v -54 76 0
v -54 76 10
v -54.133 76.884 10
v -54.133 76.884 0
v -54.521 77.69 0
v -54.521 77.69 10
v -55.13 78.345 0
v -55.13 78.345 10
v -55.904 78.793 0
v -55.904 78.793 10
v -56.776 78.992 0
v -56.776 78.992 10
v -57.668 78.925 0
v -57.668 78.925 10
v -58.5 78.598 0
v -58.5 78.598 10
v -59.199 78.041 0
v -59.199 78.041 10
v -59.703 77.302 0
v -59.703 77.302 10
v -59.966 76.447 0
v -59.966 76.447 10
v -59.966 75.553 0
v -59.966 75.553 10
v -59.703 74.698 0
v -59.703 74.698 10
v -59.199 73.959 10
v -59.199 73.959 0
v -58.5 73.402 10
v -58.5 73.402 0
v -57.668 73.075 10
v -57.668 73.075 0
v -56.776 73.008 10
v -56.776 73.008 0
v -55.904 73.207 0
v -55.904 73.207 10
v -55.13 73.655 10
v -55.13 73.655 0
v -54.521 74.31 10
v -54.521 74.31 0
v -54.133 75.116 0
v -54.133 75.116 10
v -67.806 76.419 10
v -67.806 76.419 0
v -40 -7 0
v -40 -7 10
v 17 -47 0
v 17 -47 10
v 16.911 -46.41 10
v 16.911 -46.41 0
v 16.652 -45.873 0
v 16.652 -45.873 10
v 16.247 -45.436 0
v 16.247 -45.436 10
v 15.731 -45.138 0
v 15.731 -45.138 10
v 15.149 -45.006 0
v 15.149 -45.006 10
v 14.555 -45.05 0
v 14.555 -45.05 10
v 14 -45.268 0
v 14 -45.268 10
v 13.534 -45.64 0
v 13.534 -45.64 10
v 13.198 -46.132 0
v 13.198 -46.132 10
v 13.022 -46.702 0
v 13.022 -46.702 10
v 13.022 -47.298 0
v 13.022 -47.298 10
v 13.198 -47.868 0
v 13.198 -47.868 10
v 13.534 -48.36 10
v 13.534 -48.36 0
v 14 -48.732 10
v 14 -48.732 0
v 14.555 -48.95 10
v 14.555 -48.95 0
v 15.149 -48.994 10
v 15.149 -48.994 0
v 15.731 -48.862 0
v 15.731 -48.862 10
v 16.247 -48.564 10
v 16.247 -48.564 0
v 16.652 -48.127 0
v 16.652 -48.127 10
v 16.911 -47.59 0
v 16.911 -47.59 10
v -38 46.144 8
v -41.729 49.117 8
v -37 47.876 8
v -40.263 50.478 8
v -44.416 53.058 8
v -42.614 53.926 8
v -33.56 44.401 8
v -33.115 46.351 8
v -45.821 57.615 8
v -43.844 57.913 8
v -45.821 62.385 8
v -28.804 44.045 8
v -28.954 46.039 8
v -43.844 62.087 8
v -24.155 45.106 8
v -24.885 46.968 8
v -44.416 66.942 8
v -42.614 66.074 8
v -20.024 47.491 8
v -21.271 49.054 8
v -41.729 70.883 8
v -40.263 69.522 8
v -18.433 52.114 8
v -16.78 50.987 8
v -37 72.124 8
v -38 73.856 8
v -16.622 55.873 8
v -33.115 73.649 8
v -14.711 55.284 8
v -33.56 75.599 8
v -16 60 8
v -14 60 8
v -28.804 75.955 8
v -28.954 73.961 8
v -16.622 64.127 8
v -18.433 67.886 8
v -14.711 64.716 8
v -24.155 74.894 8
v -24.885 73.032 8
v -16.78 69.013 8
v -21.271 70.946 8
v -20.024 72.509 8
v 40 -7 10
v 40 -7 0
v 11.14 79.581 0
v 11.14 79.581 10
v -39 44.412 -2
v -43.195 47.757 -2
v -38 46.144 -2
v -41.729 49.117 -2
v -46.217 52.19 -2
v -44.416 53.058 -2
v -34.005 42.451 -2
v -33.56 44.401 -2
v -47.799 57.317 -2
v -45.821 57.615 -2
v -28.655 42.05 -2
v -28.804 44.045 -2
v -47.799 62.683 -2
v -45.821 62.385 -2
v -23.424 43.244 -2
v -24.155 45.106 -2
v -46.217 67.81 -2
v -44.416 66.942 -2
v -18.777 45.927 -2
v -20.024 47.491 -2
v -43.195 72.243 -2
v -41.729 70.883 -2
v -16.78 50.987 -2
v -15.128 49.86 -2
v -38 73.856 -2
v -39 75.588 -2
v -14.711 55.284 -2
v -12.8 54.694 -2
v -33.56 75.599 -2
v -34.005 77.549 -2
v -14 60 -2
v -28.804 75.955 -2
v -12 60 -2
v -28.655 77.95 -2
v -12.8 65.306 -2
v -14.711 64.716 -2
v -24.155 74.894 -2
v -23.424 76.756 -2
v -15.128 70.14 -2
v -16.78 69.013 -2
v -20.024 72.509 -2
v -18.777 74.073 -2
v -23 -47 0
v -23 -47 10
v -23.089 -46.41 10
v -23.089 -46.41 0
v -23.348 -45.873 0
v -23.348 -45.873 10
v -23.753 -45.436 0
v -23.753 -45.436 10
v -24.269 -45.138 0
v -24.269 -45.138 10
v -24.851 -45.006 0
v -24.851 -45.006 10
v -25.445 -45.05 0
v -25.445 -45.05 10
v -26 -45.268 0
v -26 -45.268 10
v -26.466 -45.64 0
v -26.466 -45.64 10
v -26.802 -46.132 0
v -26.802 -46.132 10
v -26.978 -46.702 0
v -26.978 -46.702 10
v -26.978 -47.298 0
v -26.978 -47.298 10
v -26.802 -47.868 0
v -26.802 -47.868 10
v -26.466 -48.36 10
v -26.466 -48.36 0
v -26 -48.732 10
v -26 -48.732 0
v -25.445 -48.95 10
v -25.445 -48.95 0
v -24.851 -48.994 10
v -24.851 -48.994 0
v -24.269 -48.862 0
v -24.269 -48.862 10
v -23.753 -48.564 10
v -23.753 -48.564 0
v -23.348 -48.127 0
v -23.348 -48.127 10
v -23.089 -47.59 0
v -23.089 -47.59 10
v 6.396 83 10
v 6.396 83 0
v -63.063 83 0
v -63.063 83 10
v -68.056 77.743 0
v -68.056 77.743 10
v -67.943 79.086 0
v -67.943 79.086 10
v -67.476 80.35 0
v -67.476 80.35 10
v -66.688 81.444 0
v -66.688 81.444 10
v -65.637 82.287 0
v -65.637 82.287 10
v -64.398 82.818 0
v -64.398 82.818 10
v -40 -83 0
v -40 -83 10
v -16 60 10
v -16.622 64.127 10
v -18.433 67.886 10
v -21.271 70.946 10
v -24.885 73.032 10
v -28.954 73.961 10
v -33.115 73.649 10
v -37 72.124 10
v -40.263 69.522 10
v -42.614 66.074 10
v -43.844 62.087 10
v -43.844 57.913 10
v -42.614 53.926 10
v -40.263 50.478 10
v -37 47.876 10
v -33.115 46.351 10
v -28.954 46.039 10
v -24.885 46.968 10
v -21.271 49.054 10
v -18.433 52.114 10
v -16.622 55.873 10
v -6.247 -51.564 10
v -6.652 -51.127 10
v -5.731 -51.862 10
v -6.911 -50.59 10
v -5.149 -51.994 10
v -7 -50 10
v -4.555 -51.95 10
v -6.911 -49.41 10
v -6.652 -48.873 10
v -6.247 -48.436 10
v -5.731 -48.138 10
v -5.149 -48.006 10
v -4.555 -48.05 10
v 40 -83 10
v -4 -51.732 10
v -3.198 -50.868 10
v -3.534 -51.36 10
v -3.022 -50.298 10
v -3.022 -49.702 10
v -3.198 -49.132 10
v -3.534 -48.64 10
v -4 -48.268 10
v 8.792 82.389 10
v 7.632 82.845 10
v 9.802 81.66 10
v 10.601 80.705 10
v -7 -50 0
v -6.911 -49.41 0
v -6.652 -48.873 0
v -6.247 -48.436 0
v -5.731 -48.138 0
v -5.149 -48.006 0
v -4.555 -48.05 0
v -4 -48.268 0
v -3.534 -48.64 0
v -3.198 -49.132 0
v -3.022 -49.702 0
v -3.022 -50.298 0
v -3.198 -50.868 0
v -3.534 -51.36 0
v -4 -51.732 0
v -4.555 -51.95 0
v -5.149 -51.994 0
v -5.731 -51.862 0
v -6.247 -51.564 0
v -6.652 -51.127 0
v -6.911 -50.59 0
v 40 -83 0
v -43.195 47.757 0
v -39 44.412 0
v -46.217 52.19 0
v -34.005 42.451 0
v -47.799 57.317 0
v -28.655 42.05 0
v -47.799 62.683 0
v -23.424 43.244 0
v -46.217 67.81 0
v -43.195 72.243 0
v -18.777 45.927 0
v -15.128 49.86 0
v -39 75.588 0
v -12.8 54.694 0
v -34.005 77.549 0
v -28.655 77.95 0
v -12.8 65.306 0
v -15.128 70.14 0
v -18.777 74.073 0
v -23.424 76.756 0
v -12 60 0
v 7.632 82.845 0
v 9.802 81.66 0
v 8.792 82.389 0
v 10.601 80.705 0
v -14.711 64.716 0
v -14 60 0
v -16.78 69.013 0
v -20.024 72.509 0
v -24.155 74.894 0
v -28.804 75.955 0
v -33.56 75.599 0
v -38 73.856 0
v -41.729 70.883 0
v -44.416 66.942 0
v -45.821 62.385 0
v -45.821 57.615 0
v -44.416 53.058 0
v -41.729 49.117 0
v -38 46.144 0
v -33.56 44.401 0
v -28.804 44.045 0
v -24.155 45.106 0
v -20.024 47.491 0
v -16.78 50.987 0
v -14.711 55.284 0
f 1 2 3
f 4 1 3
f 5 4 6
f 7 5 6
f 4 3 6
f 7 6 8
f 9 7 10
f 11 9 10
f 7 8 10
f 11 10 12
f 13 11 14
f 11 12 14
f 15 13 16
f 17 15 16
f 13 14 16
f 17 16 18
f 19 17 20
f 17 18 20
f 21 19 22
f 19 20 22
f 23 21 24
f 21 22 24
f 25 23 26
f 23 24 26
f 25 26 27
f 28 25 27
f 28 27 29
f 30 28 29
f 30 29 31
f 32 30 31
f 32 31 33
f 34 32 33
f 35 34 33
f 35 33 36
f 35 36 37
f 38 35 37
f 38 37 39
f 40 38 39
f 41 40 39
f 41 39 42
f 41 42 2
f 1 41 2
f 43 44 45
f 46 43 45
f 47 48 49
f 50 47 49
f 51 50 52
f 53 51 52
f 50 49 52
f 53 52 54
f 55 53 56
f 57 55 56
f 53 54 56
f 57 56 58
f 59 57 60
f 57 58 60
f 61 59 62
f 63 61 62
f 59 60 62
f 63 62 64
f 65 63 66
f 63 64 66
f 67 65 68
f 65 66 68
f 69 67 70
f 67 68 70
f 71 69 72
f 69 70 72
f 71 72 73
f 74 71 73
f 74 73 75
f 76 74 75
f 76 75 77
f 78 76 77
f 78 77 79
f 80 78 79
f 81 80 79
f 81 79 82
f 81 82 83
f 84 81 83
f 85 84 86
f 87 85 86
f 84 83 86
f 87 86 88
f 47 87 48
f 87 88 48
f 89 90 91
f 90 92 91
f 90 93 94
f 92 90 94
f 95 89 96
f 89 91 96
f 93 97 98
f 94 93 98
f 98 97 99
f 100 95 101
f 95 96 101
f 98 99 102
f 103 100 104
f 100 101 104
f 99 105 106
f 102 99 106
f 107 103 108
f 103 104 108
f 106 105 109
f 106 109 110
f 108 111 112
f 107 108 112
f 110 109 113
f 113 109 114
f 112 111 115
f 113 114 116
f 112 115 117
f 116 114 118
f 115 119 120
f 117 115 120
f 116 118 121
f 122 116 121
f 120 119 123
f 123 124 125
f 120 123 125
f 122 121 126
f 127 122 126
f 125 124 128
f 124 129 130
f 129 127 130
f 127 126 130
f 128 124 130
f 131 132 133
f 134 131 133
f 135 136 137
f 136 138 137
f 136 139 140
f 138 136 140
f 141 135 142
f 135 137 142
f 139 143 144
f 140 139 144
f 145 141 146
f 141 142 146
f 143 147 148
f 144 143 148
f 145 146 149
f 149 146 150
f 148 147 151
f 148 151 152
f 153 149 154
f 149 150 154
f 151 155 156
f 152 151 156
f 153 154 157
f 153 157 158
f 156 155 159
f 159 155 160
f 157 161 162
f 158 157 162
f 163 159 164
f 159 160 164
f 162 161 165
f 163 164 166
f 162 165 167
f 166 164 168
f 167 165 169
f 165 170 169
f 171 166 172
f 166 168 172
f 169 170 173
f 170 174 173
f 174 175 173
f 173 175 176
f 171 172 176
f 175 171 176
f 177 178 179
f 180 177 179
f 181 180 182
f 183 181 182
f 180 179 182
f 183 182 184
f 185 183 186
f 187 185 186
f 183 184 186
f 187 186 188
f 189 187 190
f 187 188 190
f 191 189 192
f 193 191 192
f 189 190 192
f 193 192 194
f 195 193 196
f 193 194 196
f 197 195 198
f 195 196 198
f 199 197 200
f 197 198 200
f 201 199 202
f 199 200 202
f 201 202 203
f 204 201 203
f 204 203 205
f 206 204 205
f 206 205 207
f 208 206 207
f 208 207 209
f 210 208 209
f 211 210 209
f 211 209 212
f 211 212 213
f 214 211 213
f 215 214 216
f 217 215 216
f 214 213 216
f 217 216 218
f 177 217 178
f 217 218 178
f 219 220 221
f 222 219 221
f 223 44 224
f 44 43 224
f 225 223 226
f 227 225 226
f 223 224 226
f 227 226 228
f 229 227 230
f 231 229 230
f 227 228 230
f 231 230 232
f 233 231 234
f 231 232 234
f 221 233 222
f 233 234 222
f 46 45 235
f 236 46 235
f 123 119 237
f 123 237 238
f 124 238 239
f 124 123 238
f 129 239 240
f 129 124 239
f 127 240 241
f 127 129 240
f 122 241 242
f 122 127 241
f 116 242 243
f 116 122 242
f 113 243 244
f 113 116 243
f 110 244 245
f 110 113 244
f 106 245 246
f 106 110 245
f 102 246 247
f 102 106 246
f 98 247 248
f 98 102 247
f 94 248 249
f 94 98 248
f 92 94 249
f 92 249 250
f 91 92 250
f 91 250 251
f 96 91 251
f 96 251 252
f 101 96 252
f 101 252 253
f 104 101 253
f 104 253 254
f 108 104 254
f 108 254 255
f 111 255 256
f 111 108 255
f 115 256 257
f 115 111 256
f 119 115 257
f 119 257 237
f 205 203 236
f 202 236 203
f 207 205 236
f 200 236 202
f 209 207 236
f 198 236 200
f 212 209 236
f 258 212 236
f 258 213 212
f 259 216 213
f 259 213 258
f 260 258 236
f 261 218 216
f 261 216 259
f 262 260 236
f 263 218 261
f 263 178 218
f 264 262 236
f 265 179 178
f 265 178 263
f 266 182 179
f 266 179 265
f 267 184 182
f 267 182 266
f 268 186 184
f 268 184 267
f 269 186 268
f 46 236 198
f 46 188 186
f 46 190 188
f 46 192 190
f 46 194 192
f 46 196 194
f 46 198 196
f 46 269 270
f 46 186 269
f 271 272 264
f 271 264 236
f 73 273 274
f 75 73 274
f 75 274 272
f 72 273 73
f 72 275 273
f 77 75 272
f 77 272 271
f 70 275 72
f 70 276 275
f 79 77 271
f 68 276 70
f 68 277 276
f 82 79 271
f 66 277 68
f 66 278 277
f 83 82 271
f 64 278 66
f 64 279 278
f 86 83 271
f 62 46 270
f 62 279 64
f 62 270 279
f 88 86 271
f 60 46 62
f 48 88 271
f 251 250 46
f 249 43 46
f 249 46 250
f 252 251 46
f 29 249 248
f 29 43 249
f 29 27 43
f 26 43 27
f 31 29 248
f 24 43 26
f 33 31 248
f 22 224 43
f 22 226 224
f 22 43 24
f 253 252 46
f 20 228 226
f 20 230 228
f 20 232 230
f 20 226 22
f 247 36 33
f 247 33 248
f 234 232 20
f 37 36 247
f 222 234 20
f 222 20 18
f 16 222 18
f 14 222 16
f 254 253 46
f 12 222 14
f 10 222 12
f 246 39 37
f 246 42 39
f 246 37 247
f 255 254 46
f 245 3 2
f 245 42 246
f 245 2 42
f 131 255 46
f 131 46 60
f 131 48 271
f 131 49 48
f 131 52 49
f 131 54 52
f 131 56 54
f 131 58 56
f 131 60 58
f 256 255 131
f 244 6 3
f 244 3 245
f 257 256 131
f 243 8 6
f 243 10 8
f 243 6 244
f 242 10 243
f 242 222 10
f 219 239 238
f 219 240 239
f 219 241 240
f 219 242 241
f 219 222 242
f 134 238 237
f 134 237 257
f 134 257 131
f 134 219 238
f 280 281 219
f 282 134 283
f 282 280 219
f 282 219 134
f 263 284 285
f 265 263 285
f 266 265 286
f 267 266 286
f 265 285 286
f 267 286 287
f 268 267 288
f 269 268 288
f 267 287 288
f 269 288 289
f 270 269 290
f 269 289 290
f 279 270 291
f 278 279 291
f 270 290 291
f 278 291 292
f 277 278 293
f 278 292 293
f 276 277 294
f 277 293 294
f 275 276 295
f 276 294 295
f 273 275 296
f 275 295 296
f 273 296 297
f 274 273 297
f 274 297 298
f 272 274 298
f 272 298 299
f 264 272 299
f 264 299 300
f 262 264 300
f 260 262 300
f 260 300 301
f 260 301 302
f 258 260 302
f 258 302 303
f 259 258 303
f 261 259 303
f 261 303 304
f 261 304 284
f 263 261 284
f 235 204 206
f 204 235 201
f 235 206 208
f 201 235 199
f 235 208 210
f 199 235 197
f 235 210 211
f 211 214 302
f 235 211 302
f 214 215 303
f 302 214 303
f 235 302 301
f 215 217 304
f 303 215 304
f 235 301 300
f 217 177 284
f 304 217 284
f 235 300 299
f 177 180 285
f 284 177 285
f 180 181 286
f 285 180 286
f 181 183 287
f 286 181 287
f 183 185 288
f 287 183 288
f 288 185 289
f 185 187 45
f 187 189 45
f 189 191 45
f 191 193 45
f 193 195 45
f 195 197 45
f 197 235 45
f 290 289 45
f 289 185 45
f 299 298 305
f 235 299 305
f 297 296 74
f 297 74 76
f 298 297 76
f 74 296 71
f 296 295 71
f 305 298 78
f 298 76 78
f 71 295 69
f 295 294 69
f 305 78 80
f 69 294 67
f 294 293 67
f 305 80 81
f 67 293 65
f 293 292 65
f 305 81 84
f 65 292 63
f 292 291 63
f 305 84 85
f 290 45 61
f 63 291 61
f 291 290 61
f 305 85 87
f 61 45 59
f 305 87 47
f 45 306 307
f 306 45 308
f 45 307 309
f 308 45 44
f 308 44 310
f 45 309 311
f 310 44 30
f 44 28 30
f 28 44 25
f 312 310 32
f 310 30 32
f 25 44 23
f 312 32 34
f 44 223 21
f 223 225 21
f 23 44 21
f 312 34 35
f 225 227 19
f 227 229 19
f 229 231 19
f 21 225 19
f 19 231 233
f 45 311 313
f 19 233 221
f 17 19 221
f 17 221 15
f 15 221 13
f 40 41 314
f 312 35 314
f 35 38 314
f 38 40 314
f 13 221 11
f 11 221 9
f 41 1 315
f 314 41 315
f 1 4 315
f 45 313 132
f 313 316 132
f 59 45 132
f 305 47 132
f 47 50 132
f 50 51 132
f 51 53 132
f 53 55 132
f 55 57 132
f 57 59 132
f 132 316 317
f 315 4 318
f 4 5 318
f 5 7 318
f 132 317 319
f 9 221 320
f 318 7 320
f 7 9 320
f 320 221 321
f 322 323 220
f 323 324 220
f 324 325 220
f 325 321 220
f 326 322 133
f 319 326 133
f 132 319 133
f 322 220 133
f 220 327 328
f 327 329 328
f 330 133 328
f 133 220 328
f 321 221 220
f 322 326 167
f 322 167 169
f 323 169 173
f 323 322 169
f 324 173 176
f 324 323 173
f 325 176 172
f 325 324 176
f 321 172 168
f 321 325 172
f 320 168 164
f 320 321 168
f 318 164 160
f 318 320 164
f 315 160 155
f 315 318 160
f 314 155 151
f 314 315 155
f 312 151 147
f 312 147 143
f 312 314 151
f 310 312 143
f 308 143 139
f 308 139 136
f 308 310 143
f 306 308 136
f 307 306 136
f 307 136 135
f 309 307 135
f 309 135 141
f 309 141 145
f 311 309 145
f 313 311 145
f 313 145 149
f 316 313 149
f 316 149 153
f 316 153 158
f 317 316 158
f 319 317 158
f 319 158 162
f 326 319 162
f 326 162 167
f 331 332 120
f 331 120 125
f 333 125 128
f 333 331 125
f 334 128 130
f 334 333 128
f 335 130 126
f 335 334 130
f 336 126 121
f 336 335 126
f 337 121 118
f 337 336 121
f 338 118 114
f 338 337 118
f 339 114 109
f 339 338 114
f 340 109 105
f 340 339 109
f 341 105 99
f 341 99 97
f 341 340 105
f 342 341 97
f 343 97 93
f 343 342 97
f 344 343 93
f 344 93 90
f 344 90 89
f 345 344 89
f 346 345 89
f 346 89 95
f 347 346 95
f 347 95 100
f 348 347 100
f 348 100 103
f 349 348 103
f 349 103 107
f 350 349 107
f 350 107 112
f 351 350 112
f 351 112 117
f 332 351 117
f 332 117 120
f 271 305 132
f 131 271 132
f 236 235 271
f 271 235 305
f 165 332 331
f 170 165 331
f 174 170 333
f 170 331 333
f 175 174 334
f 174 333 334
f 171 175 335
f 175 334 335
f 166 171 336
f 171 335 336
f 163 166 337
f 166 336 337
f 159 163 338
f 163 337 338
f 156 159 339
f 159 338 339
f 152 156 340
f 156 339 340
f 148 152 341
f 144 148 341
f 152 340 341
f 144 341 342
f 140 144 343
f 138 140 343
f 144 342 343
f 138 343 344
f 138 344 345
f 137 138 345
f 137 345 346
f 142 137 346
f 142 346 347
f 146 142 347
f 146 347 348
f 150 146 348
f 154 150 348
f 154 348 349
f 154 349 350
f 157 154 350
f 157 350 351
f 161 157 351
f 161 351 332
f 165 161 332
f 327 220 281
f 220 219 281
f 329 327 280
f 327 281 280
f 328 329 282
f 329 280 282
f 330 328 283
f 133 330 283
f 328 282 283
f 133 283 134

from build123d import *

# Parameters (mm, degrees)
SKETCH1_R           = 16
BOSS_EXTRUDE1_DEPTH = 10
SKETCH2_R           = 18
SKETCH2_R_2         = 16
BOSS_EXTRUDE2_DEPTH = 12
SKETCH3_R           = 2
CUT_EXTRUDE1_DEPTH  = 10
CUT_EXTRUDE2_REACH  = 14
SKETCH4_R           = 3
CUT_EXTRUDE3_REACH  = 12
SKETCH5_R           = 2
FILLET1_R           = 5
BOSS_EXTRUDE3_START = -2
SKETCH7_R           = 16
SKETCH7_R_2         = 14
BOSS_EXTRUDE3_DEPTH = 2


with BuildPart() as part:
    # Sketch1 → Boss-Extrude1 (new body)
    with BuildSketch(Plane.XY):
        Polygon((-40, 83), (-70, 83), (-40, -7), (-40, -83), (40, -83), (40, -7), (10, 83), align=None)
        with Locations((-30, 60)):
            Circle(SKETCH1_R, mode=Mode.SUBTRACT)
    extrude(amount=BOSS_EXTRUDE1_DEPTH)

    # Sketch2 → Boss-Extrude2 (add)
    with BuildSketch(Plane.XY.offset(10)):
        with Locations((-30, 60)):
            Circle(SKETCH2_R)
        with Locations((-30, 60)):
            Circle(SKETCH2_R_2, mode=Mode.SUBTRACT)
    extrude(amount=-BOSS_EXTRUDE2_DEPTH)

    # Sketch3 → Cut-Extrude1 (cut)
    with BuildSketch(Plane.XY.offset(10)):
        with Locations((-25, -47)):
            Circle(SKETCH3_R)
        with Locations((15, -47)):
            Circle(SKETCH3_R)
    extrude(amount=-CUT_EXTRUDE1_DEPTH, mode=Mode.SUBTRACT)

    # Sketch4 → Cut-Extrude2 (cut, up to next)
    with BuildSketch(Plane.XY.offset(10), mode=Mode.PRIVATE) as cut_extrude2_sk1:
        with Locations((-57, 76)):
            Circle(SKETCH4_R)
    cut_extrude2_tool1 = extrude(cut_extrude2_sk1.sketch, amount=-CUT_EXTRUDE2_REACH, mode=Mode.PRIVATE) & part.part
    add(cut_extrude2_tool1.solids().sort_by_distance((-57, 76, 10))[0], mode=Mode.SUBTRACT)

    # Sketch5 → Cut-Extrude3 (cut, up to next)
    with BuildSketch(Plane(origin=(0, 0, 0), x_dir=(-1, 0, 0), z_dir=(0, 0, -1)), mode=Mode.PRIVATE) as cut_extrude3_sk1:
        with Locations((5, -50)):
            Circle(SKETCH5_R)
    cut_extrude3_tool1 = extrude(cut_extrude3_sk1.sketch, amount=-CUT_EXTRUDE3_REACH, mode=Mode.PRIVATE) & part.part
    add(cut_extrude3_tool1.solids().sort_by_distance((-5, -50, 0))[0], mode=Mode.SUBTRACT)

    # Fillet1
    fillet1_edges = [part.edges().sort_by_distance(p)[0] for p in [
        (-70, 83, 5),
        (10, 83, 5),
    ]]
    fillet(fillet1_edges, radius=FILLET1_R)

    # Sketch7 → Boss-Extrude3 (add)
    with BuildSketch(Plane.XY.offset(10).offset(BOSS_EXTRUDE3_START)):
        with Locations((-30, 60)):
            Circle(SKETCH7_R)
        with Locations((-30, 60)):
            Circle(SKETCH7_R_2, mode=Mode.SUBTRACT)
    extrude(amount=BOSS_EXTRUDE3_DEPTH)


solid = part.part
